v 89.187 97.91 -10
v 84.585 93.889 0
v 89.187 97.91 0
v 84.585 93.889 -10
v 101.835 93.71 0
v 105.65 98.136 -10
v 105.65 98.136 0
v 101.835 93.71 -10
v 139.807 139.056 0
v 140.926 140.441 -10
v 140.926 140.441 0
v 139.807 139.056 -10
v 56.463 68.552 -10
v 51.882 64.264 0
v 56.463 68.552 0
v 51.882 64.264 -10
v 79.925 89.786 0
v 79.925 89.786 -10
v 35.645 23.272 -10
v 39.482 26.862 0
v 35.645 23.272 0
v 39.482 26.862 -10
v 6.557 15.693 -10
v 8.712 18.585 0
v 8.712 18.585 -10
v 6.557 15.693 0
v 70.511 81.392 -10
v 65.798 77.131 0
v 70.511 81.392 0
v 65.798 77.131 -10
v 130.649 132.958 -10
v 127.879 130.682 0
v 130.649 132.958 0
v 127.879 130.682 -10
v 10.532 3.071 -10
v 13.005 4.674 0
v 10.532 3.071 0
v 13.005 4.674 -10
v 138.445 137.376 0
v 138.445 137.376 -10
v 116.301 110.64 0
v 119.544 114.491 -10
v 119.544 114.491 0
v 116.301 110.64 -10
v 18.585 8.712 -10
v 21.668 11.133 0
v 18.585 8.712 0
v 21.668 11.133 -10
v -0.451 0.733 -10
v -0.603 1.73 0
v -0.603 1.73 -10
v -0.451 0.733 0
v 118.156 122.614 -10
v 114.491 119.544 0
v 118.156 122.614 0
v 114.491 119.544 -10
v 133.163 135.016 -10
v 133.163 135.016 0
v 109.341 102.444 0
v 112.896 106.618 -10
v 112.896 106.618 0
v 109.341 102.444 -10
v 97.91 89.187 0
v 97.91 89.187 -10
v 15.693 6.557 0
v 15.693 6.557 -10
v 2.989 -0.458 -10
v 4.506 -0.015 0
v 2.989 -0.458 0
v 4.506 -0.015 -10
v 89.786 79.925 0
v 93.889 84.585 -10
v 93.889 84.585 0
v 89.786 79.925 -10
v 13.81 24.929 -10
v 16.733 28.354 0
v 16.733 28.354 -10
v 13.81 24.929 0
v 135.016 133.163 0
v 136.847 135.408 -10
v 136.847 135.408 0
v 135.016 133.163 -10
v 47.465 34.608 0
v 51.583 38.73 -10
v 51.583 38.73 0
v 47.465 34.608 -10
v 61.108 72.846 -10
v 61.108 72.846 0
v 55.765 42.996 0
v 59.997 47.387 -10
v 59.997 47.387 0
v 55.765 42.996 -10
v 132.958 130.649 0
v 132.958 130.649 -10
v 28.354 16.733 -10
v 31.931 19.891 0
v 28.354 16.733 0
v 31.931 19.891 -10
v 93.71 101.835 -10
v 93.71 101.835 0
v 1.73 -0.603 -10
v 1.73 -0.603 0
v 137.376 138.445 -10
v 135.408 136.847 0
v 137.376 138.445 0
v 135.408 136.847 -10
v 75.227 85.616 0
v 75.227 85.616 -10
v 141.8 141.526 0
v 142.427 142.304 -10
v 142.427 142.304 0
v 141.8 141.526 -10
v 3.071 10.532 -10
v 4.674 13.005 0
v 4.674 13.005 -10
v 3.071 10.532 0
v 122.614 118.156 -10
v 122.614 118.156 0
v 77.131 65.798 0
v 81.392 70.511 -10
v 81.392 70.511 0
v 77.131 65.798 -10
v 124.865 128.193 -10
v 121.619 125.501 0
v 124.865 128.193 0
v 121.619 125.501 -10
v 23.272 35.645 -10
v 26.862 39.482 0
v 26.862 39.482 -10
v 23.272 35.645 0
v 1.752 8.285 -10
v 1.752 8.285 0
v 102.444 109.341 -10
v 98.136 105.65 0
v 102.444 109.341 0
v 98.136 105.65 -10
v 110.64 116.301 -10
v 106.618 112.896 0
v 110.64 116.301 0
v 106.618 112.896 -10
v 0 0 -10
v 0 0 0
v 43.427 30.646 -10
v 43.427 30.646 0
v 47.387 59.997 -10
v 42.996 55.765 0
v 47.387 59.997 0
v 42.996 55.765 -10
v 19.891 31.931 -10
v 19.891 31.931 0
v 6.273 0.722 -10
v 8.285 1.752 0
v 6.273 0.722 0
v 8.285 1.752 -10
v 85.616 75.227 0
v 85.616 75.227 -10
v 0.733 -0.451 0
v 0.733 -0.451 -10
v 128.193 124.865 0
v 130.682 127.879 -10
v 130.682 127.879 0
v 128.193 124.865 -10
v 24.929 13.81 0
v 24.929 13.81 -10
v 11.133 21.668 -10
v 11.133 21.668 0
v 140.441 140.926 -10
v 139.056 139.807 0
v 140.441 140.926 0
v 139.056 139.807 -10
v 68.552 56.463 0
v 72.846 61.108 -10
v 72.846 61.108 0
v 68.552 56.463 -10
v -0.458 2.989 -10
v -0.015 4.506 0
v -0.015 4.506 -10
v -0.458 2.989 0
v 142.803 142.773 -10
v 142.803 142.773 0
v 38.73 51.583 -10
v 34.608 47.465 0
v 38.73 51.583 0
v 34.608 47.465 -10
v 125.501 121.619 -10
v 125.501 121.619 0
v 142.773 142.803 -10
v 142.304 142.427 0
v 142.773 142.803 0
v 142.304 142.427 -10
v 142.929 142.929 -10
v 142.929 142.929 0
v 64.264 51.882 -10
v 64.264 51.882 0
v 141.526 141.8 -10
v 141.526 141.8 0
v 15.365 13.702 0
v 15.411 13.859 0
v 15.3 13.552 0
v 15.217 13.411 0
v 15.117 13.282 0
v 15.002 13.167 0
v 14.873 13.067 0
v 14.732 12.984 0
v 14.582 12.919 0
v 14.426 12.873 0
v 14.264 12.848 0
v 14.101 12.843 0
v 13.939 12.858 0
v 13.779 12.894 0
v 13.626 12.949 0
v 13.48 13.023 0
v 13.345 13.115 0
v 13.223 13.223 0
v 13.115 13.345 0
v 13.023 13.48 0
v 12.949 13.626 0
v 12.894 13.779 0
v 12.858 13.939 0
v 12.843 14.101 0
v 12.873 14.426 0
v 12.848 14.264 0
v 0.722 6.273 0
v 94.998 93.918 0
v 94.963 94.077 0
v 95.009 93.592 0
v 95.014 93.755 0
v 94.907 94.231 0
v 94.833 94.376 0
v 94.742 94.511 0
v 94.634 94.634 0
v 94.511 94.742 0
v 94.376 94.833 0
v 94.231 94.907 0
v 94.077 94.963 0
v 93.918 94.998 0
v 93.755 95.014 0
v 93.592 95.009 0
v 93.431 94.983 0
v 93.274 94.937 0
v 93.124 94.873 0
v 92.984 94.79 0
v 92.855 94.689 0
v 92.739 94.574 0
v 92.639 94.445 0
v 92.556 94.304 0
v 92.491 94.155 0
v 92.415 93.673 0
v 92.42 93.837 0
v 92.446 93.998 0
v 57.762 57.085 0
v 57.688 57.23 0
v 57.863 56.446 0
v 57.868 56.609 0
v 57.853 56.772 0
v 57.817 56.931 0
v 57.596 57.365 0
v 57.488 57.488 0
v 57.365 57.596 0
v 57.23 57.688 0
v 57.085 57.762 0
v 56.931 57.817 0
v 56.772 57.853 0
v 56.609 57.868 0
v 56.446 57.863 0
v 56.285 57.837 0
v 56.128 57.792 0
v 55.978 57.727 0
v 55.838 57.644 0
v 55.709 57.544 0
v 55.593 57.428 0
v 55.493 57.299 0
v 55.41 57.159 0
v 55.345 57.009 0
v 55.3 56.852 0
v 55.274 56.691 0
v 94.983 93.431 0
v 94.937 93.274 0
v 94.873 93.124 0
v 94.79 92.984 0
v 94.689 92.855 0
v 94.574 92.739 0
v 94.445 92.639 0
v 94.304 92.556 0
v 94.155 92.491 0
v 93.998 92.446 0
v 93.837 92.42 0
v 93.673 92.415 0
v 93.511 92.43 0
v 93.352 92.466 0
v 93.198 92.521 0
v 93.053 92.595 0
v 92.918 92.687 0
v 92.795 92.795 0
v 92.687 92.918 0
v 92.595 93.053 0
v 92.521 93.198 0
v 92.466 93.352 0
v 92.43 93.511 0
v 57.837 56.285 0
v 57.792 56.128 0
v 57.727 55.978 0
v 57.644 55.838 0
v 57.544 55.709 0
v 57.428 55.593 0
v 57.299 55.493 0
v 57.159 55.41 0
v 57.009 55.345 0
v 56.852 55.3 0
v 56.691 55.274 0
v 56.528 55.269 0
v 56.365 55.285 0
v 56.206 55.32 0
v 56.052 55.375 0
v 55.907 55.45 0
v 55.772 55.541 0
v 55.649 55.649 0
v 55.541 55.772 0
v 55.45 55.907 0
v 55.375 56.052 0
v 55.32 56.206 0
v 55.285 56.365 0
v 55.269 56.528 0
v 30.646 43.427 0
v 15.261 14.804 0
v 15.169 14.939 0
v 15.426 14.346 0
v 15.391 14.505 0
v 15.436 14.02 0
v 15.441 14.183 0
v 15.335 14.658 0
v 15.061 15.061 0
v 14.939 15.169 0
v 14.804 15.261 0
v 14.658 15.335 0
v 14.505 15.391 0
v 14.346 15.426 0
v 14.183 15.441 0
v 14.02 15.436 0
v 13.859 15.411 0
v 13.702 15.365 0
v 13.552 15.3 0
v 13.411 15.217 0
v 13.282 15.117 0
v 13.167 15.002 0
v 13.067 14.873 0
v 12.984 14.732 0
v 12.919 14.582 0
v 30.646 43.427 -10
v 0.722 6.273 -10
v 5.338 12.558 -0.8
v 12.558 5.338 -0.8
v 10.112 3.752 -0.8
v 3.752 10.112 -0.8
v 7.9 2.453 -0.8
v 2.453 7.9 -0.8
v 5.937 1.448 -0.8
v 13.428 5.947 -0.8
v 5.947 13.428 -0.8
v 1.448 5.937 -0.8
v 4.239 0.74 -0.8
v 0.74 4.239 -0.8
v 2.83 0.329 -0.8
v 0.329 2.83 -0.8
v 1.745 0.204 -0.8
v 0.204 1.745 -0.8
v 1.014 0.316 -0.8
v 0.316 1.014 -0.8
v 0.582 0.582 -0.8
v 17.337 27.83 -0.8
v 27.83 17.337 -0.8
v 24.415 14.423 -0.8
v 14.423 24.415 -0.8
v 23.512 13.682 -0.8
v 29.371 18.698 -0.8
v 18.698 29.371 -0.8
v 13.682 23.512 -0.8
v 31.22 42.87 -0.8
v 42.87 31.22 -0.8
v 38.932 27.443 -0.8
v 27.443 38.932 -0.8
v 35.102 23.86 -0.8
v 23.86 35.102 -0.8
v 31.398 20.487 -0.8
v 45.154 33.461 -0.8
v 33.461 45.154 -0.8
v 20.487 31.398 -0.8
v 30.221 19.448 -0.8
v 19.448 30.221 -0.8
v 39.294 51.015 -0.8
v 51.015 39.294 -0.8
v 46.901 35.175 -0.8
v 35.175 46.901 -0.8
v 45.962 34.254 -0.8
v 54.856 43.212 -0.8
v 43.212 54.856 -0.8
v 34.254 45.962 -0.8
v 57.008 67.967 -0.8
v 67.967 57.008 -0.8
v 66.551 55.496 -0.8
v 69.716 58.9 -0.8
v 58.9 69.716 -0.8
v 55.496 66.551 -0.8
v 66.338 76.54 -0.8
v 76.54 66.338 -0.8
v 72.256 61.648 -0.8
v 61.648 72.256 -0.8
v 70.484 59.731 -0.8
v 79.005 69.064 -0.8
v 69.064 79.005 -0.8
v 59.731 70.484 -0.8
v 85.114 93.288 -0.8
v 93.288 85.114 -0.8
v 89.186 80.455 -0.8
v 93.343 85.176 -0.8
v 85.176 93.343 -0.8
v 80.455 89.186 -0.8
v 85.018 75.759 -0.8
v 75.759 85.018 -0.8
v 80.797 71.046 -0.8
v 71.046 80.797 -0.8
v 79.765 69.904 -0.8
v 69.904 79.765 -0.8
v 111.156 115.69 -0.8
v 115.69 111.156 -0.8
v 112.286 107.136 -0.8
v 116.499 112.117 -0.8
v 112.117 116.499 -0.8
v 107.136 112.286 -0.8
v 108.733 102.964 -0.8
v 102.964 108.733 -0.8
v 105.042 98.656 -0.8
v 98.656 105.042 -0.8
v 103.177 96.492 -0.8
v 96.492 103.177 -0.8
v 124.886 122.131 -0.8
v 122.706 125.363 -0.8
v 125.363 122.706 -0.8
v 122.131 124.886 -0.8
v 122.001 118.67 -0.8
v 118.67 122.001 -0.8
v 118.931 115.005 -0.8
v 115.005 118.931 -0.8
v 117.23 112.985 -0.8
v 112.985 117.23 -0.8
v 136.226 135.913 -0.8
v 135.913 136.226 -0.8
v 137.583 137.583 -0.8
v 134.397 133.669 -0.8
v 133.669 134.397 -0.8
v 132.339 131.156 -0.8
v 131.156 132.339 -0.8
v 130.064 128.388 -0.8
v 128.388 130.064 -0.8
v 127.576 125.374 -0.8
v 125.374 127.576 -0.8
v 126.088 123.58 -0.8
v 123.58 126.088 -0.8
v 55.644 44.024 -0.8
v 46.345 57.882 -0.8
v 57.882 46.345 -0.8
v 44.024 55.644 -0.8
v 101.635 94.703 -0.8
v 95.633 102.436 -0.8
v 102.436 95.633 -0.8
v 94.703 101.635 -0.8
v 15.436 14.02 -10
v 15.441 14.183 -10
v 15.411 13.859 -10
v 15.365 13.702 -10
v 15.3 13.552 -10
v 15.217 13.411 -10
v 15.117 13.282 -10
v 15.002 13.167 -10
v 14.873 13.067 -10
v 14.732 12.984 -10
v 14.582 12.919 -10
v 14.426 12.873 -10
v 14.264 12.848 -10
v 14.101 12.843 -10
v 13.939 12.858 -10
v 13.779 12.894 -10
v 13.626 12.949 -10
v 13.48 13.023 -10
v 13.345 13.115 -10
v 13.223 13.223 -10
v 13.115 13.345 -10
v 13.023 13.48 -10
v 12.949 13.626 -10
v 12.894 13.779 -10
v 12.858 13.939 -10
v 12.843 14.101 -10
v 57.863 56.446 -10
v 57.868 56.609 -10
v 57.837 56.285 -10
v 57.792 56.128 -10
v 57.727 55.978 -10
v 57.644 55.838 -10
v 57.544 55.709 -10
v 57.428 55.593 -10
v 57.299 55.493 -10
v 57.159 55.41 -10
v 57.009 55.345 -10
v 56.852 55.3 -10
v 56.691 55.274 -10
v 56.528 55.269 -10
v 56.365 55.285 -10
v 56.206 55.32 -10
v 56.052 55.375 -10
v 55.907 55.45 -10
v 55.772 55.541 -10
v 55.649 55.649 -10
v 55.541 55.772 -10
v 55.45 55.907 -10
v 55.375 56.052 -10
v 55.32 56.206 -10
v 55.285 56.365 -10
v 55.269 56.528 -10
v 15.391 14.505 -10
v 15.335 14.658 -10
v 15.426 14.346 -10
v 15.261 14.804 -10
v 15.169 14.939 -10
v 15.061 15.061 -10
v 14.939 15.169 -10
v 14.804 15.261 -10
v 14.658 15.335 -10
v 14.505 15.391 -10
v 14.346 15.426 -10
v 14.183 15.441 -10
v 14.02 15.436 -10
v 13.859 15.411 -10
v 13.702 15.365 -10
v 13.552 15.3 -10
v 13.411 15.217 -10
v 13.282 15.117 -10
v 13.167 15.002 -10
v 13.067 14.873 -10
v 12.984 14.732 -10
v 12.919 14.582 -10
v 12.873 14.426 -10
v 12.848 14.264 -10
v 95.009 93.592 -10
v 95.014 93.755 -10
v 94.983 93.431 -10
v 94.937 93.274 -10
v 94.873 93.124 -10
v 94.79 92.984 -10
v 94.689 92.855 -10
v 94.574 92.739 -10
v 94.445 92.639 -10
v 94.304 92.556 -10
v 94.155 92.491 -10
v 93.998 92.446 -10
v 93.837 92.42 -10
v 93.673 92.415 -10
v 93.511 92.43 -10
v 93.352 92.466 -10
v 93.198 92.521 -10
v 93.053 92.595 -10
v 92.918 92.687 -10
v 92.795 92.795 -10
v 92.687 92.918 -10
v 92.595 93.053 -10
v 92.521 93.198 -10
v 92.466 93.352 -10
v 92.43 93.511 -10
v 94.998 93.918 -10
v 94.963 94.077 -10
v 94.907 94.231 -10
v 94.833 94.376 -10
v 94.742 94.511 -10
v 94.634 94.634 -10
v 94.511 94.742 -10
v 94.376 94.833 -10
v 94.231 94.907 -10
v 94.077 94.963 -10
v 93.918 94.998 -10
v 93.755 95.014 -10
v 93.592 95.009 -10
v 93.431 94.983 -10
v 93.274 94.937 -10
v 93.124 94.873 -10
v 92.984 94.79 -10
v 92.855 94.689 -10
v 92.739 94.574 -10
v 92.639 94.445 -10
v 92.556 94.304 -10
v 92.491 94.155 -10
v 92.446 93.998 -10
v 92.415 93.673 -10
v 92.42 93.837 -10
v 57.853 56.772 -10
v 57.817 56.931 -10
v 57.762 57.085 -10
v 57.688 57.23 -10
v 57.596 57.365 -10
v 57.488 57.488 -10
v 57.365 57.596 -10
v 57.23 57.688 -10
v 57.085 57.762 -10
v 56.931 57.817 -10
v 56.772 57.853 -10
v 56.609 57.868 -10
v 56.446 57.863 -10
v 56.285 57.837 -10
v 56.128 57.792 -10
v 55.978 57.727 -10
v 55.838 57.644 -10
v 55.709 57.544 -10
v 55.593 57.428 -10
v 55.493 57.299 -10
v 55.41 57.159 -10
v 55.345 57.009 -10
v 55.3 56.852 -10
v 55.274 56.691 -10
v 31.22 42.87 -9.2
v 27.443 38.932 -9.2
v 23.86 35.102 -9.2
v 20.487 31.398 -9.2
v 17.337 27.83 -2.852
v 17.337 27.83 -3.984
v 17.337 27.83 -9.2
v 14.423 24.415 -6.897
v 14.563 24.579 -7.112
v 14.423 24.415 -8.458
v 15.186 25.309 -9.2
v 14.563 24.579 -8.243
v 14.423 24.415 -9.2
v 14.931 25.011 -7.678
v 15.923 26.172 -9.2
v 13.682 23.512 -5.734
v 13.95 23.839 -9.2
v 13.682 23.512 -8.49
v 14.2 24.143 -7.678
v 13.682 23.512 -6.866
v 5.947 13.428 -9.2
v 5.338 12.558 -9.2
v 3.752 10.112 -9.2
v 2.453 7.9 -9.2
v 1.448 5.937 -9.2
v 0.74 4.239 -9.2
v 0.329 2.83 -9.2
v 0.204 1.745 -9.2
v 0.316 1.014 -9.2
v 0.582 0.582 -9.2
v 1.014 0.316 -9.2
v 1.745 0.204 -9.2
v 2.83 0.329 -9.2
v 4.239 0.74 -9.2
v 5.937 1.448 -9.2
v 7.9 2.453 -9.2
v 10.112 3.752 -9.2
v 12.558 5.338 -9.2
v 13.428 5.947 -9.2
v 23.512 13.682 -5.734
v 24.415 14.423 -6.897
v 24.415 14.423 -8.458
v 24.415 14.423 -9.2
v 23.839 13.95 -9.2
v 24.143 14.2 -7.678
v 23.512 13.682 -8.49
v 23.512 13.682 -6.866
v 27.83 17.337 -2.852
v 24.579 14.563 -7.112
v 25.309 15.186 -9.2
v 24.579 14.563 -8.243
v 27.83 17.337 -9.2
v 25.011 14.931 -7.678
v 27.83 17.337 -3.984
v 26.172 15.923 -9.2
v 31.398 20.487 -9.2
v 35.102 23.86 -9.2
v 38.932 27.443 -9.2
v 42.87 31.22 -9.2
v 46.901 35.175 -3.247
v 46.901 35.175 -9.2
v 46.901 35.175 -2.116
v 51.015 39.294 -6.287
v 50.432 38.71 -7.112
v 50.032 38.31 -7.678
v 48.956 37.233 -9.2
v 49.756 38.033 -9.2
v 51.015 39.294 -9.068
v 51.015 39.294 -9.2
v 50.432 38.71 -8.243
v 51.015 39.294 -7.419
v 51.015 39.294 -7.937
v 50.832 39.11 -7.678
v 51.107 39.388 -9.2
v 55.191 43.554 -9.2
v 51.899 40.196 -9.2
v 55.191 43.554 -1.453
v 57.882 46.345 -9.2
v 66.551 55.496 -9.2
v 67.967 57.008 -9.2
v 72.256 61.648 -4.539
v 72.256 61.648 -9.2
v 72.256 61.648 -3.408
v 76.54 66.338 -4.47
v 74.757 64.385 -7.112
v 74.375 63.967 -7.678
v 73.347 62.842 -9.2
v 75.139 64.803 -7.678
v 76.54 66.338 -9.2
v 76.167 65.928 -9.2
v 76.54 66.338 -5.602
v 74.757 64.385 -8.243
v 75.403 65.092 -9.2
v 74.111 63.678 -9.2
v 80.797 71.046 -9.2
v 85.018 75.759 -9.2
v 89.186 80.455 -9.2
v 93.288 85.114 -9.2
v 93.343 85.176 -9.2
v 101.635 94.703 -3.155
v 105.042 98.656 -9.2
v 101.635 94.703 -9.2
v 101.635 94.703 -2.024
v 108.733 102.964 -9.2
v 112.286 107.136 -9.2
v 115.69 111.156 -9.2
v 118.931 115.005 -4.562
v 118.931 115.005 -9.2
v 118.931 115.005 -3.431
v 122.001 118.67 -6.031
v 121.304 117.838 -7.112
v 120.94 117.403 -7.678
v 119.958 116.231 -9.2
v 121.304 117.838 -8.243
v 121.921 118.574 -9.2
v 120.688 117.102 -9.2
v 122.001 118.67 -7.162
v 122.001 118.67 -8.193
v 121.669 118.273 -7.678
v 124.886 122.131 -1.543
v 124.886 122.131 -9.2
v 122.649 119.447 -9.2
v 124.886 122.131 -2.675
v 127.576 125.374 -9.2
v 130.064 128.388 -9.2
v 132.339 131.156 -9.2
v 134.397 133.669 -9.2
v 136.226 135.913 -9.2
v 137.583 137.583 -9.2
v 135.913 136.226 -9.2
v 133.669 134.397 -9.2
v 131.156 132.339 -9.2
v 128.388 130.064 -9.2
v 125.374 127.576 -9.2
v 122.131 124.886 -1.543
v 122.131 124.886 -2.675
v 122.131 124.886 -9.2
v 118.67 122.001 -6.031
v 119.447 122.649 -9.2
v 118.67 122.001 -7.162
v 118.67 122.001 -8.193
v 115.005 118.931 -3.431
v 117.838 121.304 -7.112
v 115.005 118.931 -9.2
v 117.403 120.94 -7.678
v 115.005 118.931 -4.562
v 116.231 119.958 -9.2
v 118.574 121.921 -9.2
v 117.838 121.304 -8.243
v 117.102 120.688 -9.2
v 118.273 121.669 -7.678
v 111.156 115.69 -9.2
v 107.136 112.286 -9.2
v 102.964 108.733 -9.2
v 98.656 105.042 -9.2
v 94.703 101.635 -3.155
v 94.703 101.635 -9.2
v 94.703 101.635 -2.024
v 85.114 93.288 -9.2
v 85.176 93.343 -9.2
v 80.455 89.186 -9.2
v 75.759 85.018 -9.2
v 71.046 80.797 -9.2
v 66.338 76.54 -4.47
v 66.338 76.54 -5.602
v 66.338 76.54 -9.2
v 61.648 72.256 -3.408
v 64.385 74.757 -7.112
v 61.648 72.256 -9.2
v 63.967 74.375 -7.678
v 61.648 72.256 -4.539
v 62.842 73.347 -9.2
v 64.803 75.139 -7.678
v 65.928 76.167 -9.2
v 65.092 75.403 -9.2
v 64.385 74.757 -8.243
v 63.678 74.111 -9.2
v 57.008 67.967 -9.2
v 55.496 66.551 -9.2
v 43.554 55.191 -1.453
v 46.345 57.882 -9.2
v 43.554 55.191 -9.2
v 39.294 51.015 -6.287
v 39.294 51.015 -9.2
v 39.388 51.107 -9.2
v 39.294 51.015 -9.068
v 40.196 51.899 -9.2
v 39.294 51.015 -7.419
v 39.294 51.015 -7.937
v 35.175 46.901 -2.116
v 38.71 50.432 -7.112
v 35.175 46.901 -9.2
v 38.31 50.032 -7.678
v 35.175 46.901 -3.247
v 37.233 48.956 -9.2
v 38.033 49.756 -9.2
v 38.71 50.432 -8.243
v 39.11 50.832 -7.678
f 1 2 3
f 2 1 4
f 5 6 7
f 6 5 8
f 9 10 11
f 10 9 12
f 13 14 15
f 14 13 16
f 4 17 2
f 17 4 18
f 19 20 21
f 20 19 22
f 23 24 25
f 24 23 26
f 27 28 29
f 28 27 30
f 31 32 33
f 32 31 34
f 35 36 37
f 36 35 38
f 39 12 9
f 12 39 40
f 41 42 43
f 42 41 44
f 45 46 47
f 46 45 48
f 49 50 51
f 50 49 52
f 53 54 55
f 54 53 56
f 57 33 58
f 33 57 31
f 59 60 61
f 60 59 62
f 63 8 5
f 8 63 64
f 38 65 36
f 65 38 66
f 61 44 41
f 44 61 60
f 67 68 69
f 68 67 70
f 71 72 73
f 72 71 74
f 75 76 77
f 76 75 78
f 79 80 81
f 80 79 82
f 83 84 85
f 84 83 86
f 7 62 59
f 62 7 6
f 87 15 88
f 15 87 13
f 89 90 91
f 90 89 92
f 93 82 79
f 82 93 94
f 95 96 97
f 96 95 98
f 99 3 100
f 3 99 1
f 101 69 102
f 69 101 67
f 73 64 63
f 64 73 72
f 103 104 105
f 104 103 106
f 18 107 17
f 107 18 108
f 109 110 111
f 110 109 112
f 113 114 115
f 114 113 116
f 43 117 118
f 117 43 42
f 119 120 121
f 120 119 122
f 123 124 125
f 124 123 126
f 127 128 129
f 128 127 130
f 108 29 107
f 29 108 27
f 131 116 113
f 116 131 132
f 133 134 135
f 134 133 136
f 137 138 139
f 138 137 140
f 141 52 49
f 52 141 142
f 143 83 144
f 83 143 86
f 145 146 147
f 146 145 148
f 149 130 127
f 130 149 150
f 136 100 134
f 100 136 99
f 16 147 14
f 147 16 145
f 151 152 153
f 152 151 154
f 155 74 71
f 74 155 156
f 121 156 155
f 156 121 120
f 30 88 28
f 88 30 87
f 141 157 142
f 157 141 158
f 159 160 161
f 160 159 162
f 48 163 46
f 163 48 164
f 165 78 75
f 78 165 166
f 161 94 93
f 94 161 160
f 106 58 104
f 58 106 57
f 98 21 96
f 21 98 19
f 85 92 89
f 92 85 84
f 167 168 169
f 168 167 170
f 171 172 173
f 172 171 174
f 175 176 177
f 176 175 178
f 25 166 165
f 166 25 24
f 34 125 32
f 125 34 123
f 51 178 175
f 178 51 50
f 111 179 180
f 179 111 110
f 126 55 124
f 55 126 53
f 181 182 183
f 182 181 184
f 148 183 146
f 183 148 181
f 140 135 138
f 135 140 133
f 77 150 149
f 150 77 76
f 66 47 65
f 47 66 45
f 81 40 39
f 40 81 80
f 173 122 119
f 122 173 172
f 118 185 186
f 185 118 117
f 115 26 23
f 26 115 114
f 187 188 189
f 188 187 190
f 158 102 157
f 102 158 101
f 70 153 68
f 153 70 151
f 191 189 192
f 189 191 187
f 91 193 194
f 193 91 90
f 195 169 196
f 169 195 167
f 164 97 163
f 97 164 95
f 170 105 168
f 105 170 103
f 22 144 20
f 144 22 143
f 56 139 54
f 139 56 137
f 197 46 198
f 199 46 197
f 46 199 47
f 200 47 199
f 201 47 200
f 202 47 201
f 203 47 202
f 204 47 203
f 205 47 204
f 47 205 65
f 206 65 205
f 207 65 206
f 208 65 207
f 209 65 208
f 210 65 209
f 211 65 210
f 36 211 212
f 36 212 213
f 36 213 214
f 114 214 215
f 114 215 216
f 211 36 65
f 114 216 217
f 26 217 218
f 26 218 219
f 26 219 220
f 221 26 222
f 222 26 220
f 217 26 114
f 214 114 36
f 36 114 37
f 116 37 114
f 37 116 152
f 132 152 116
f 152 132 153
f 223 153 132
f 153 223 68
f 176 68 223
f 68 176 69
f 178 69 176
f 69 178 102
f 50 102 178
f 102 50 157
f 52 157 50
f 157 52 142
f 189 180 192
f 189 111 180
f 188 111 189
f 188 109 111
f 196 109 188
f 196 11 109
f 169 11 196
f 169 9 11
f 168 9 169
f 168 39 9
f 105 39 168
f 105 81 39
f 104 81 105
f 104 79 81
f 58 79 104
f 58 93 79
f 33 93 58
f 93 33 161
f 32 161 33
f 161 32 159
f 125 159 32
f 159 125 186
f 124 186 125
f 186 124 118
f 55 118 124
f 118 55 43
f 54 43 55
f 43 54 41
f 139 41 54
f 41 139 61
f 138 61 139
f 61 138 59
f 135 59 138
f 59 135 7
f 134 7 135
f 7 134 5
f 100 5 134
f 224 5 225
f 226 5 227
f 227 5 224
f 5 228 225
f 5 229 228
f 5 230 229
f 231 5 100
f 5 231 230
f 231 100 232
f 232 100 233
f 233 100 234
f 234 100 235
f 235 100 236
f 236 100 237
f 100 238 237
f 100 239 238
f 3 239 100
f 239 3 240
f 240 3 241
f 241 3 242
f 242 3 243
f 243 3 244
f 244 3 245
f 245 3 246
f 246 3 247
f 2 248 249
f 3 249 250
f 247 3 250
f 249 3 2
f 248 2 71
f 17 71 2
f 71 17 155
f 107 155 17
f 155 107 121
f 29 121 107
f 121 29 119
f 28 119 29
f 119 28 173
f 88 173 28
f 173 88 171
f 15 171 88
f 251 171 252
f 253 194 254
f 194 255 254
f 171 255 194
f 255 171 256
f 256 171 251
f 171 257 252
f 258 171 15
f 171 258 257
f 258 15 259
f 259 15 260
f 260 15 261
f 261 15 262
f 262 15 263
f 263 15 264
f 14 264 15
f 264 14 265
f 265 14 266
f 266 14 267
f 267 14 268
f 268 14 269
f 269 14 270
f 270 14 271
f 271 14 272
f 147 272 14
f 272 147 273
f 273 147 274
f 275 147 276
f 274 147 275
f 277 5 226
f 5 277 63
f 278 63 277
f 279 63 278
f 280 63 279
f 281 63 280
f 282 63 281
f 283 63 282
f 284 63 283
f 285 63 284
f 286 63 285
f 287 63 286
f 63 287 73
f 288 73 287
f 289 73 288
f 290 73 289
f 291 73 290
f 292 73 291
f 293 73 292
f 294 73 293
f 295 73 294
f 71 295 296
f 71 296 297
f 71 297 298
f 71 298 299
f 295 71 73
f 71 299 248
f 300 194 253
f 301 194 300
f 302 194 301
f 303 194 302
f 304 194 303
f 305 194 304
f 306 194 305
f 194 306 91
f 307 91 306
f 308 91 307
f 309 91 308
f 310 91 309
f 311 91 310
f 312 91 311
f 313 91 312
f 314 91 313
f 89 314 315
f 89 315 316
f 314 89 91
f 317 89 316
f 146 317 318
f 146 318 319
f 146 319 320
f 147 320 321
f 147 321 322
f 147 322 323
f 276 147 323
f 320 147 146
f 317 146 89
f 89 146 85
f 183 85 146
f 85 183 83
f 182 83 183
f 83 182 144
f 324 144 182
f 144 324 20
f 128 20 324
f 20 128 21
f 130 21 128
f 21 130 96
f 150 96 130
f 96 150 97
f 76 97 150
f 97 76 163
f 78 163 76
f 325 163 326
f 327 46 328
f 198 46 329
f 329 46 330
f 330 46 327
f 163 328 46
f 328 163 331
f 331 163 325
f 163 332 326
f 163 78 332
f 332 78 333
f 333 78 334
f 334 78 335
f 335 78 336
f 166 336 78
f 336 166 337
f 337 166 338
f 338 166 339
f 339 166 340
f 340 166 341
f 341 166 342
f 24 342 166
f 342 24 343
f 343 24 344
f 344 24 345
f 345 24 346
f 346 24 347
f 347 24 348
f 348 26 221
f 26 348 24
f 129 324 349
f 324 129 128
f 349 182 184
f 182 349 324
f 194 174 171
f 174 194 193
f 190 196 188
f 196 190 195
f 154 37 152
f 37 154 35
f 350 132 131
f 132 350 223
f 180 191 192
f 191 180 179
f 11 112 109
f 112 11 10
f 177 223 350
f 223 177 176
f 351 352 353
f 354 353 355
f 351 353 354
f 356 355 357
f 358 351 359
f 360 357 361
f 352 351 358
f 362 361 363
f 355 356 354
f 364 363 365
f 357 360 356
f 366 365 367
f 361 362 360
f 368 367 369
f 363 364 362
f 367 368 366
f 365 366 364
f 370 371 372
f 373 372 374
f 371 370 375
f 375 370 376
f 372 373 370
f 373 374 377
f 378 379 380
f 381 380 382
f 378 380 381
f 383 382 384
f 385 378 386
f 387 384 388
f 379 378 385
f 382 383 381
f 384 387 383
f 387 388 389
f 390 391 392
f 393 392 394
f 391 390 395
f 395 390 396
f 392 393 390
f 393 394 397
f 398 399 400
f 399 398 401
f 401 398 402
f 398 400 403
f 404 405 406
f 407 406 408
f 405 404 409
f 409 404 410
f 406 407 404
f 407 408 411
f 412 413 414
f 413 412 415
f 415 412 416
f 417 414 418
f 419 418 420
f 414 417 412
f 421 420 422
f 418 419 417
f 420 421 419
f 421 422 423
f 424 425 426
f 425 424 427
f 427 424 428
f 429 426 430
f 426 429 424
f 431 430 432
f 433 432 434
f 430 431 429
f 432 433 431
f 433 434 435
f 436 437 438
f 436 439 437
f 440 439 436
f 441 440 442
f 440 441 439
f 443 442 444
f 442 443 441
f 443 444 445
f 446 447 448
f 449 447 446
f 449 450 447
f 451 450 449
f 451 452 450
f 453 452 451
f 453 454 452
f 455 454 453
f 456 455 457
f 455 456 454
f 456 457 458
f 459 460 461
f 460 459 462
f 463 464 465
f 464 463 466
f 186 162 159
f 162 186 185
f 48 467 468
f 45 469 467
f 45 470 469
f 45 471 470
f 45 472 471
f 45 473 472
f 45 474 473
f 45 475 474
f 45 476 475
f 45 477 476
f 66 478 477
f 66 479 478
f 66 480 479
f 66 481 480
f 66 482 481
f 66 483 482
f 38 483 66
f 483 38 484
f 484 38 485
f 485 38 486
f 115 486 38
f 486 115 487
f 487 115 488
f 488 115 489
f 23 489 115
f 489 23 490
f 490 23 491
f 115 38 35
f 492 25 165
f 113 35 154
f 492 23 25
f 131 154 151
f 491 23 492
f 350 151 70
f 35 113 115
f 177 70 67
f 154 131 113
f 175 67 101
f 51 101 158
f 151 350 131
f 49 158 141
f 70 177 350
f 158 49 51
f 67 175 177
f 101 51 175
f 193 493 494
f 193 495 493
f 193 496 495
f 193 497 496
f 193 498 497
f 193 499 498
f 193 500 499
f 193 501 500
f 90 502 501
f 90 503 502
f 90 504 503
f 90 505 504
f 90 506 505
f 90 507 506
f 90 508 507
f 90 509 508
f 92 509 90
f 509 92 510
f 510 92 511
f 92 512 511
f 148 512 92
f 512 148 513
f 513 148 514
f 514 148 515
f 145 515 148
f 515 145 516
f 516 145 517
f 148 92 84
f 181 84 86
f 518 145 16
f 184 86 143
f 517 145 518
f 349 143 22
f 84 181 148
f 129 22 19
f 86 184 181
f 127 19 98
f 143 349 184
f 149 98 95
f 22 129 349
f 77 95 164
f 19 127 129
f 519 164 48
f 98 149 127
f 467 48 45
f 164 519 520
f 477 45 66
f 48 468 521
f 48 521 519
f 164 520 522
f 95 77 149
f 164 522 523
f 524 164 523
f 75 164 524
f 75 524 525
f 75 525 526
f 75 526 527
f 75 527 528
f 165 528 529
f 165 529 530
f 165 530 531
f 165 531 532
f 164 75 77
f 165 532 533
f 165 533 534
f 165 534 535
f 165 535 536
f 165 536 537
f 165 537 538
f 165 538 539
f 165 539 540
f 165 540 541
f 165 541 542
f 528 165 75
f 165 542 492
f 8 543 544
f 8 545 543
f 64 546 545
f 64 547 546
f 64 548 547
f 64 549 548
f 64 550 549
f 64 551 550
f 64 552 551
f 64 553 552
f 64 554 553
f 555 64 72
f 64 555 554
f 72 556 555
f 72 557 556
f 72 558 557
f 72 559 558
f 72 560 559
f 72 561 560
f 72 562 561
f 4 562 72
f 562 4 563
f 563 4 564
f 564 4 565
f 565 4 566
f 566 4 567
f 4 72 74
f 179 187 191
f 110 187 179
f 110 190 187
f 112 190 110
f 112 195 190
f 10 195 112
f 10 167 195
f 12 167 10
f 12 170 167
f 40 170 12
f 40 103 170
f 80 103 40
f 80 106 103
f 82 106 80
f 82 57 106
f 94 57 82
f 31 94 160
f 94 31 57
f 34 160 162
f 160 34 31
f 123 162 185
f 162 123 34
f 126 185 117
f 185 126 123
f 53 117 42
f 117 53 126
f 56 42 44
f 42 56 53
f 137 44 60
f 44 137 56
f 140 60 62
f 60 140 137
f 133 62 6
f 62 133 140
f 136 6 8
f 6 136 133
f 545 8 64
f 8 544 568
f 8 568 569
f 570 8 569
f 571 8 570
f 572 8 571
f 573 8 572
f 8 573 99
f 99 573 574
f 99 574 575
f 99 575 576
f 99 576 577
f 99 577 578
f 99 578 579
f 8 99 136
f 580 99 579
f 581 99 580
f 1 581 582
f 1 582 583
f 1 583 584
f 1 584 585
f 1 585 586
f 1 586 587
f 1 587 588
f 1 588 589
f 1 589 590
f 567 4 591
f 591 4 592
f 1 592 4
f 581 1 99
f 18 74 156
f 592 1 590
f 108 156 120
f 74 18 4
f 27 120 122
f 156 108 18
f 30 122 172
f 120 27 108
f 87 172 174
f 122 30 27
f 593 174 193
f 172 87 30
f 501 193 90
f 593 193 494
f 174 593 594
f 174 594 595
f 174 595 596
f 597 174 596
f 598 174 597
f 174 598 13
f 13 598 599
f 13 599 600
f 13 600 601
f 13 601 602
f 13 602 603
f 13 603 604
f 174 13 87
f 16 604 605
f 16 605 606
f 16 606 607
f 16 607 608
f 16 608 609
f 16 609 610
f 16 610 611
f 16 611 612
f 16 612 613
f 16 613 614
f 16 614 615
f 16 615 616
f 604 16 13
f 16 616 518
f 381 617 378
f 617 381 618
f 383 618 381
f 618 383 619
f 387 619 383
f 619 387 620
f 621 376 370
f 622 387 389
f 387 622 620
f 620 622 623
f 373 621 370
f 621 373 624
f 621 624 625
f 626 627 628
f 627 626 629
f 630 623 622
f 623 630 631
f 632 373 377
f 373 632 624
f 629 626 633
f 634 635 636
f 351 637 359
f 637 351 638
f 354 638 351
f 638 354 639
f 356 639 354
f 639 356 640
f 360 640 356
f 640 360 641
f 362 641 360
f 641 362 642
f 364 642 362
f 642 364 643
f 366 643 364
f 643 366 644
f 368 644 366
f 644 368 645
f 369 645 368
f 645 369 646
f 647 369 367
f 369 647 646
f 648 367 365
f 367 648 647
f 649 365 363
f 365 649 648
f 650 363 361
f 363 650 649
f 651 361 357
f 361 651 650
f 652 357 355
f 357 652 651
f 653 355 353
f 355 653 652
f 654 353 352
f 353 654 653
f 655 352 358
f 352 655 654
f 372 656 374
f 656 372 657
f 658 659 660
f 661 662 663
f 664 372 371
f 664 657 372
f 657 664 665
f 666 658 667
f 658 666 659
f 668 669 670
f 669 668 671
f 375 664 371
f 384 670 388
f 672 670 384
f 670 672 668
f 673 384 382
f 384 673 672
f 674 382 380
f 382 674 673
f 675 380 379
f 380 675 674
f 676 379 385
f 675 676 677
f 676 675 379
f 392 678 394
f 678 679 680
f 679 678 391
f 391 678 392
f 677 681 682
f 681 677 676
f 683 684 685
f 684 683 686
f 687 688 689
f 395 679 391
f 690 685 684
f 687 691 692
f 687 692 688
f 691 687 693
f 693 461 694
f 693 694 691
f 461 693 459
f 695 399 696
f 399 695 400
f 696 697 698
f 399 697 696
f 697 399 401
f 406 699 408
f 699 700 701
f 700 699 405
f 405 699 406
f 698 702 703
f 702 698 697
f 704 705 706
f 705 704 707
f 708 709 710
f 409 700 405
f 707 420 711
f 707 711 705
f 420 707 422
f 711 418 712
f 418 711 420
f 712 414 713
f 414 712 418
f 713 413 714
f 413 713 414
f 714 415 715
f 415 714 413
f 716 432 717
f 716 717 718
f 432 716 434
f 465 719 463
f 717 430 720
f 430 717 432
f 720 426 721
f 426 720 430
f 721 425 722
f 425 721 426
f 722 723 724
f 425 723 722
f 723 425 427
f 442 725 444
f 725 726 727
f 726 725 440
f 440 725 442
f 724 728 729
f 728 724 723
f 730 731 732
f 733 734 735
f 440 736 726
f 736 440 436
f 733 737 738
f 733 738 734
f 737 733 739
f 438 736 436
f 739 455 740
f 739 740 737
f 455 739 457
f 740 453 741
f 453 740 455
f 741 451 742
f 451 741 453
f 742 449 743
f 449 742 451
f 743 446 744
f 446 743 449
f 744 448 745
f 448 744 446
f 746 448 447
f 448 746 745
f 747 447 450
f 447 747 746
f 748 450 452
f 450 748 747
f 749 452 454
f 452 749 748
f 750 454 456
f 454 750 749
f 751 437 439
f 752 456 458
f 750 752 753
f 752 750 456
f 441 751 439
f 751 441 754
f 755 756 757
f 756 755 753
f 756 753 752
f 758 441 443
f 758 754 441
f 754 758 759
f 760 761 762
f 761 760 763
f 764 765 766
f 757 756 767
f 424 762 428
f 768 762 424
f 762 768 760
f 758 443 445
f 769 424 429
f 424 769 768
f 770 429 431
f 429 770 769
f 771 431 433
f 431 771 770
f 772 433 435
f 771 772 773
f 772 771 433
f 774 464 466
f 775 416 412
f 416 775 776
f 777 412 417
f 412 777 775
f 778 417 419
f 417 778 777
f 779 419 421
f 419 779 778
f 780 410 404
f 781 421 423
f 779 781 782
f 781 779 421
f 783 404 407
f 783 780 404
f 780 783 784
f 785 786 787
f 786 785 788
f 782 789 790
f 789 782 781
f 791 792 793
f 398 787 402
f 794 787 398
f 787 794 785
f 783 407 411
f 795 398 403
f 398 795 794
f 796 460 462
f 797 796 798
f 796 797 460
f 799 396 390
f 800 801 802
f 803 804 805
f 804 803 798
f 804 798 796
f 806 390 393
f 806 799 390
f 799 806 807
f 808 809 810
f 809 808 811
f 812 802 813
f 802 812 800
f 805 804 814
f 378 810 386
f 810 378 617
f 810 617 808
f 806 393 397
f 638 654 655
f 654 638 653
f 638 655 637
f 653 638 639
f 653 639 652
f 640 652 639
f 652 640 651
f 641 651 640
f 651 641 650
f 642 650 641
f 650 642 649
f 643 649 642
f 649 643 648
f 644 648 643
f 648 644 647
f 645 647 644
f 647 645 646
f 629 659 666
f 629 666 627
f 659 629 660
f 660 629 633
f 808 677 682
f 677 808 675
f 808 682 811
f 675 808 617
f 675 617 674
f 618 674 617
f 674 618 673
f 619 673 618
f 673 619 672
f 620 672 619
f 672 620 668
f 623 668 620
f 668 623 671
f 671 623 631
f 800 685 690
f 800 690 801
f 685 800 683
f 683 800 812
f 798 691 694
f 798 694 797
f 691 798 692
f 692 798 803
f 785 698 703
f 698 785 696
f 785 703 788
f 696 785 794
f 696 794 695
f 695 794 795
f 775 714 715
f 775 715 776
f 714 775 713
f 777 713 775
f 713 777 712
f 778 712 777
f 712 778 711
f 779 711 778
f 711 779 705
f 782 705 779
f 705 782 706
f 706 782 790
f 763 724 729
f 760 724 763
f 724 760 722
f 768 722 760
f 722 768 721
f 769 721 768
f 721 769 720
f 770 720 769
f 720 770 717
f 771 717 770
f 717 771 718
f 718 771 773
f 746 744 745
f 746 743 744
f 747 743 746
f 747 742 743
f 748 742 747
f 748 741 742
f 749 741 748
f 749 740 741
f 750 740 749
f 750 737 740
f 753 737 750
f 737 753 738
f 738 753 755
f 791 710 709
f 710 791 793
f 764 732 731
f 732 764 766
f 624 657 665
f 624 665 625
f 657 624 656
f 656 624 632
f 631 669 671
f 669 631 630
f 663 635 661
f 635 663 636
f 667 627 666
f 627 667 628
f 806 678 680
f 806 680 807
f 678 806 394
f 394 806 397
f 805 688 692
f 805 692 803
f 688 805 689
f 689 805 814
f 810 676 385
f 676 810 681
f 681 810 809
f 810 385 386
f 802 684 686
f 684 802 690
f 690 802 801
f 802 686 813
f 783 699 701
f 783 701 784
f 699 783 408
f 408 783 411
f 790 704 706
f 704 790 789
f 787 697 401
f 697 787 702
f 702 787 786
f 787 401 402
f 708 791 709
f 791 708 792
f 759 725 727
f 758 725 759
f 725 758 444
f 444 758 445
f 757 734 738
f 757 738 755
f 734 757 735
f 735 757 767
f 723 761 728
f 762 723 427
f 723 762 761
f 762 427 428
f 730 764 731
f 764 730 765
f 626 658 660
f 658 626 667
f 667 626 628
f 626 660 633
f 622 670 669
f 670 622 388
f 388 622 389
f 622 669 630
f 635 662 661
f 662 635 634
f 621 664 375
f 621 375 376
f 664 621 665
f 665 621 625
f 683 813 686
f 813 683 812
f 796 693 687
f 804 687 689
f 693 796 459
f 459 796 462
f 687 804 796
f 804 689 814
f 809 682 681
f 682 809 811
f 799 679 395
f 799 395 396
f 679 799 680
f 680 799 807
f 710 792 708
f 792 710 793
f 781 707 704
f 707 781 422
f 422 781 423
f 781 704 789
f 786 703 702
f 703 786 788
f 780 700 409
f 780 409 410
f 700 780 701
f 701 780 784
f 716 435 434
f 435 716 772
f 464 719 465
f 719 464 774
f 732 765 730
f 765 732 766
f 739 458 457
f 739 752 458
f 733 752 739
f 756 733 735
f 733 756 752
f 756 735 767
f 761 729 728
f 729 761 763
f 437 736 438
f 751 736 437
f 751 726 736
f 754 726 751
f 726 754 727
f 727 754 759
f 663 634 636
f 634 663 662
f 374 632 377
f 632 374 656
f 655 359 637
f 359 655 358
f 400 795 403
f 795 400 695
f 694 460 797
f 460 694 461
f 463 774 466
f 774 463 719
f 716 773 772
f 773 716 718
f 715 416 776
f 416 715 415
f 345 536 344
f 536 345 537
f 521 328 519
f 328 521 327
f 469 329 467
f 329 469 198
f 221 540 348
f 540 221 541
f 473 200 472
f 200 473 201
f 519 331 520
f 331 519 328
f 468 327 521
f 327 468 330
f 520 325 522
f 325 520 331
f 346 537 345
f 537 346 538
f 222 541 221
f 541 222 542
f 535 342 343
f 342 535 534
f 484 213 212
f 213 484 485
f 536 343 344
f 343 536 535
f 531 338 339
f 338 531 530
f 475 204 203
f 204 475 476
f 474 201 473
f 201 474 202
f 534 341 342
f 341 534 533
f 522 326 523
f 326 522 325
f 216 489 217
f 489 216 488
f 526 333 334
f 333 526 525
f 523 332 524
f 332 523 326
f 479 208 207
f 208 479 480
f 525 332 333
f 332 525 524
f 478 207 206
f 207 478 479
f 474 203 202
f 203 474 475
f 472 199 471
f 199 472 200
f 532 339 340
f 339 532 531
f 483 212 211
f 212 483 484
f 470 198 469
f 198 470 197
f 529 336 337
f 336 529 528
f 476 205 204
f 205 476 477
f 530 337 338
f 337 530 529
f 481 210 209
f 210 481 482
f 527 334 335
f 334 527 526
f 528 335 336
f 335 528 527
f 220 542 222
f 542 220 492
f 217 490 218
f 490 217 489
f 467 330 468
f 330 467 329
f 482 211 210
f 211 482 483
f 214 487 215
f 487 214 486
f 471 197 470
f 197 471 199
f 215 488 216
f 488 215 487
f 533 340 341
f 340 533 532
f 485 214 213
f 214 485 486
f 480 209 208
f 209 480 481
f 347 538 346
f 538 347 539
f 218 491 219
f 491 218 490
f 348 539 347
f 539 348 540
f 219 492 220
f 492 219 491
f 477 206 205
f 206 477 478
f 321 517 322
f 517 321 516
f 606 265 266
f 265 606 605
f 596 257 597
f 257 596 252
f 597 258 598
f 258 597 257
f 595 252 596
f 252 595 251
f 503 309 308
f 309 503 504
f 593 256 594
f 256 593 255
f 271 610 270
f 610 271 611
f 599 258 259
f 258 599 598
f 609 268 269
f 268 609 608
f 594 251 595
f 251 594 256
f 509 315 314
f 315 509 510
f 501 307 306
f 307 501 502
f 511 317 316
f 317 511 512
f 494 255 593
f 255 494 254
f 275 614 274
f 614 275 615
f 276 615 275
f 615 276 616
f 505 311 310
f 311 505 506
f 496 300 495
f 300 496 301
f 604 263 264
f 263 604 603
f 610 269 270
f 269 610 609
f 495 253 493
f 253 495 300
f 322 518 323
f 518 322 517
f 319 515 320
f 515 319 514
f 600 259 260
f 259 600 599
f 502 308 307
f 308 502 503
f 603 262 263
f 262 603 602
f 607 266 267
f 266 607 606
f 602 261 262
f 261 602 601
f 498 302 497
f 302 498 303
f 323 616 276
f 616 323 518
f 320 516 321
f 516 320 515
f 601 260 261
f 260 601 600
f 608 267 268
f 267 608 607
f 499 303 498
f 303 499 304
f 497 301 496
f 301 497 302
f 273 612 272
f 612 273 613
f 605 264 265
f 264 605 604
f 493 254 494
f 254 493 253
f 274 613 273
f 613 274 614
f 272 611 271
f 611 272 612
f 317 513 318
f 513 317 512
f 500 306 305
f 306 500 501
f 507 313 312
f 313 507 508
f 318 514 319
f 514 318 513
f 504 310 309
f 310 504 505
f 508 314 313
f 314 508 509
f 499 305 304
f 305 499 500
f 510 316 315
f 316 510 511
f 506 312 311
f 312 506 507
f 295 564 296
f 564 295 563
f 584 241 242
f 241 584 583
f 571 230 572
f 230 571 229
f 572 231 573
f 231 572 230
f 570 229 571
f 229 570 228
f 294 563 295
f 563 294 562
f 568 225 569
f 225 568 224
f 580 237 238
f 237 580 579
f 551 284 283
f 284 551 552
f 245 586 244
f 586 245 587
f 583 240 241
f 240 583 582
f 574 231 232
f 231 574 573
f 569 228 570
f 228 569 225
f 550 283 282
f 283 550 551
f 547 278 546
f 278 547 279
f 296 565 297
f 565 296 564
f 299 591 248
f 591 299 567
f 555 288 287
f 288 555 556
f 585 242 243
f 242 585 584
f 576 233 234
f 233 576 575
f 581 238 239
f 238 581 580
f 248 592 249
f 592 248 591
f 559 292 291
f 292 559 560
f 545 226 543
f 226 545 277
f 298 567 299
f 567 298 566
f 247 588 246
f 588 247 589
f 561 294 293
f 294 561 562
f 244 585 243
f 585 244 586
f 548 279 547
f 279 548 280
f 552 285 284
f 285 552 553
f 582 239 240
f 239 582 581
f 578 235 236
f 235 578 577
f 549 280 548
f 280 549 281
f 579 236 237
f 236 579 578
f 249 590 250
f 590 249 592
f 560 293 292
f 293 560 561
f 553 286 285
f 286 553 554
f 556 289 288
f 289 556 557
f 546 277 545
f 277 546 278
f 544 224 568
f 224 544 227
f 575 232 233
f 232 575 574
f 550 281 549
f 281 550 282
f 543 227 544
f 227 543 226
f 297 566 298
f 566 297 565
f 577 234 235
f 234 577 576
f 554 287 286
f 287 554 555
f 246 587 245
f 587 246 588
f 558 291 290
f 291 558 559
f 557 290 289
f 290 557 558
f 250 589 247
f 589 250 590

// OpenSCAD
include <../../parameters.scad>
use <../666_1028.scad>

draft = false;

rotate([180,0,45])
    666_1028_body_bottom(side_choose = 1, draft = draft);
